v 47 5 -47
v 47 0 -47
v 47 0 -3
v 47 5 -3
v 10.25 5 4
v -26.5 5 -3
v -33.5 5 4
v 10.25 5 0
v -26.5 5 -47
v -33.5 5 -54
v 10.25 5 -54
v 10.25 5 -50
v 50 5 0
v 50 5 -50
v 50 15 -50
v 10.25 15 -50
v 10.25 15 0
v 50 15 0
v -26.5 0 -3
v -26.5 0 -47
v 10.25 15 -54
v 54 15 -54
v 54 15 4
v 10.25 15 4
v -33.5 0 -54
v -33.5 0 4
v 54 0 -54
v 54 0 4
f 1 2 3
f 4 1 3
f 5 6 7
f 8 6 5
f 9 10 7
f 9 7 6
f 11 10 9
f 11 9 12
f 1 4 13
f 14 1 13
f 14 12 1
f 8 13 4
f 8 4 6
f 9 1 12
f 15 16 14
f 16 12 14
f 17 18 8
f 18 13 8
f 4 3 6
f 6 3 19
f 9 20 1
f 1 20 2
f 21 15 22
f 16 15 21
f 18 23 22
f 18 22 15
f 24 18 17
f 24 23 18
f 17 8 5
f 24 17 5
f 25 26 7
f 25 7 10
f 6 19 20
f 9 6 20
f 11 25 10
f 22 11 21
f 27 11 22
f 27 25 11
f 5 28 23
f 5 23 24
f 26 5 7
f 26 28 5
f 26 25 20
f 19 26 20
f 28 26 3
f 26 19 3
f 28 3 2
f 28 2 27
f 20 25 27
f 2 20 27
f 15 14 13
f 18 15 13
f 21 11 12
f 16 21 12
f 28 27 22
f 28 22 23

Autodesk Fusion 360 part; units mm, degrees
sketch "Sketch1" plane through (0, 0, 0) normal (0, 1, 0) x (1, 0, 0)
  line L0 (-29.5, 50) -> (50, 50)
  line L1 (50, 50) -> (50, 0)
  line L2 (50, 0) -> (-29.5, 0)
  line L3 (-29.5, 0) -> (-29.5, 50)
  line L4 (54, -4) -> (-33.5, -4)
  line L5 (-33.5, -4) -> (-33.5, 54)
  line L6 (-33.5, 54) -> (54, 54)
  line L7 (54, 54) -> (54, -4)
  line L8 (47, 3) -> (-26.5, 3)
  line L9 (-26.5, 3) -> (-26.5, 47)
  line L10 (-26.5, 47) -> (47, 47)
  line L11 (47, 47) -> (47, 3)
  dimension "d1" = 50
  dimension "d2" = 79.5
  dimension "d3" = -4
  dimension "d6" = 3
extrude "Extrude1" add sketch "Sketch1" along normal blind 5 contours L4 L5 L6 L7 makes body 1
extrude "Extrude2" add sketch "Sketch1" along normal blind 5 separate body contours L0 L1 L2 L3 makes body 2
sketch "Sketch2" plane through (0, 5, 0) normal (0, 1, 0) x (-1, 0, 0)
  line L0 (-50, 0) -> (29.5, 0)
  line L1 (29.5, 0) -> (29.5, -50)
  line L2 (29.5, -50) -> (-50, -50)
  line L3 (-50, -50) -> (-50, 0)
  line L4 (-54, -54) -> (33.5, -54)
  line L5 (33.5, -54) -> (33.5, 4)
  line L6 (33.5, 4) -> (-54, 4)
  line L7 (-54, 4) -> (-54, -54)
  line L8 (-10.25, -54) -> (-10.25, 4)
extrude "Extrude3" add sketch "Sketch2" along normal blind 10 contours L0 L2 L3 L4 L6 L7 L8 bodies 1 2
sketch "Sketch3" plane through (0, 5, 0) normal (0, 1, 0) x (-1, 0, 0)
  line L0 (-10.25, 4) -> (-10.25, 0)
  line L1 (-10.25, 0) -> (-50, 0)
  line L2 (-50, 0) -> (-50, -50)
  line L3 (-50, -50) -> (-10.25, -50)
  line L4 (-10.25, -50) -> (-10.25, -54)
  line L5 (-10.25, -54) -> (33.5, -54)
  line L6 (33.5, -54) -> (33.5, 4)
  line L7 (33.5, 4) -> (-10.25, 4)
  line L8 (26.5, -47) -> (-47, -47)
  line L9 (-47, -47) -> (-47, -3)
  line L10 (-47, -3) -> (26.5, -3)
  line L11 (26.5, -3) -> (26.5, -47)
  line L12 (-50, 0) -> (-50, -0.25)
  line L13 (-50, -0.25) -> (29, -0.25)
  line L14 (29, -0.25) -> (29, -49.75)
  line L15 (29, -49.75) -> (-50, -49.75)
  line L16 (-49.75, -79.25) -> (-49.75, -0.25)
  dimension "d11" = 0.25
  dimension "d12" = 49.5
